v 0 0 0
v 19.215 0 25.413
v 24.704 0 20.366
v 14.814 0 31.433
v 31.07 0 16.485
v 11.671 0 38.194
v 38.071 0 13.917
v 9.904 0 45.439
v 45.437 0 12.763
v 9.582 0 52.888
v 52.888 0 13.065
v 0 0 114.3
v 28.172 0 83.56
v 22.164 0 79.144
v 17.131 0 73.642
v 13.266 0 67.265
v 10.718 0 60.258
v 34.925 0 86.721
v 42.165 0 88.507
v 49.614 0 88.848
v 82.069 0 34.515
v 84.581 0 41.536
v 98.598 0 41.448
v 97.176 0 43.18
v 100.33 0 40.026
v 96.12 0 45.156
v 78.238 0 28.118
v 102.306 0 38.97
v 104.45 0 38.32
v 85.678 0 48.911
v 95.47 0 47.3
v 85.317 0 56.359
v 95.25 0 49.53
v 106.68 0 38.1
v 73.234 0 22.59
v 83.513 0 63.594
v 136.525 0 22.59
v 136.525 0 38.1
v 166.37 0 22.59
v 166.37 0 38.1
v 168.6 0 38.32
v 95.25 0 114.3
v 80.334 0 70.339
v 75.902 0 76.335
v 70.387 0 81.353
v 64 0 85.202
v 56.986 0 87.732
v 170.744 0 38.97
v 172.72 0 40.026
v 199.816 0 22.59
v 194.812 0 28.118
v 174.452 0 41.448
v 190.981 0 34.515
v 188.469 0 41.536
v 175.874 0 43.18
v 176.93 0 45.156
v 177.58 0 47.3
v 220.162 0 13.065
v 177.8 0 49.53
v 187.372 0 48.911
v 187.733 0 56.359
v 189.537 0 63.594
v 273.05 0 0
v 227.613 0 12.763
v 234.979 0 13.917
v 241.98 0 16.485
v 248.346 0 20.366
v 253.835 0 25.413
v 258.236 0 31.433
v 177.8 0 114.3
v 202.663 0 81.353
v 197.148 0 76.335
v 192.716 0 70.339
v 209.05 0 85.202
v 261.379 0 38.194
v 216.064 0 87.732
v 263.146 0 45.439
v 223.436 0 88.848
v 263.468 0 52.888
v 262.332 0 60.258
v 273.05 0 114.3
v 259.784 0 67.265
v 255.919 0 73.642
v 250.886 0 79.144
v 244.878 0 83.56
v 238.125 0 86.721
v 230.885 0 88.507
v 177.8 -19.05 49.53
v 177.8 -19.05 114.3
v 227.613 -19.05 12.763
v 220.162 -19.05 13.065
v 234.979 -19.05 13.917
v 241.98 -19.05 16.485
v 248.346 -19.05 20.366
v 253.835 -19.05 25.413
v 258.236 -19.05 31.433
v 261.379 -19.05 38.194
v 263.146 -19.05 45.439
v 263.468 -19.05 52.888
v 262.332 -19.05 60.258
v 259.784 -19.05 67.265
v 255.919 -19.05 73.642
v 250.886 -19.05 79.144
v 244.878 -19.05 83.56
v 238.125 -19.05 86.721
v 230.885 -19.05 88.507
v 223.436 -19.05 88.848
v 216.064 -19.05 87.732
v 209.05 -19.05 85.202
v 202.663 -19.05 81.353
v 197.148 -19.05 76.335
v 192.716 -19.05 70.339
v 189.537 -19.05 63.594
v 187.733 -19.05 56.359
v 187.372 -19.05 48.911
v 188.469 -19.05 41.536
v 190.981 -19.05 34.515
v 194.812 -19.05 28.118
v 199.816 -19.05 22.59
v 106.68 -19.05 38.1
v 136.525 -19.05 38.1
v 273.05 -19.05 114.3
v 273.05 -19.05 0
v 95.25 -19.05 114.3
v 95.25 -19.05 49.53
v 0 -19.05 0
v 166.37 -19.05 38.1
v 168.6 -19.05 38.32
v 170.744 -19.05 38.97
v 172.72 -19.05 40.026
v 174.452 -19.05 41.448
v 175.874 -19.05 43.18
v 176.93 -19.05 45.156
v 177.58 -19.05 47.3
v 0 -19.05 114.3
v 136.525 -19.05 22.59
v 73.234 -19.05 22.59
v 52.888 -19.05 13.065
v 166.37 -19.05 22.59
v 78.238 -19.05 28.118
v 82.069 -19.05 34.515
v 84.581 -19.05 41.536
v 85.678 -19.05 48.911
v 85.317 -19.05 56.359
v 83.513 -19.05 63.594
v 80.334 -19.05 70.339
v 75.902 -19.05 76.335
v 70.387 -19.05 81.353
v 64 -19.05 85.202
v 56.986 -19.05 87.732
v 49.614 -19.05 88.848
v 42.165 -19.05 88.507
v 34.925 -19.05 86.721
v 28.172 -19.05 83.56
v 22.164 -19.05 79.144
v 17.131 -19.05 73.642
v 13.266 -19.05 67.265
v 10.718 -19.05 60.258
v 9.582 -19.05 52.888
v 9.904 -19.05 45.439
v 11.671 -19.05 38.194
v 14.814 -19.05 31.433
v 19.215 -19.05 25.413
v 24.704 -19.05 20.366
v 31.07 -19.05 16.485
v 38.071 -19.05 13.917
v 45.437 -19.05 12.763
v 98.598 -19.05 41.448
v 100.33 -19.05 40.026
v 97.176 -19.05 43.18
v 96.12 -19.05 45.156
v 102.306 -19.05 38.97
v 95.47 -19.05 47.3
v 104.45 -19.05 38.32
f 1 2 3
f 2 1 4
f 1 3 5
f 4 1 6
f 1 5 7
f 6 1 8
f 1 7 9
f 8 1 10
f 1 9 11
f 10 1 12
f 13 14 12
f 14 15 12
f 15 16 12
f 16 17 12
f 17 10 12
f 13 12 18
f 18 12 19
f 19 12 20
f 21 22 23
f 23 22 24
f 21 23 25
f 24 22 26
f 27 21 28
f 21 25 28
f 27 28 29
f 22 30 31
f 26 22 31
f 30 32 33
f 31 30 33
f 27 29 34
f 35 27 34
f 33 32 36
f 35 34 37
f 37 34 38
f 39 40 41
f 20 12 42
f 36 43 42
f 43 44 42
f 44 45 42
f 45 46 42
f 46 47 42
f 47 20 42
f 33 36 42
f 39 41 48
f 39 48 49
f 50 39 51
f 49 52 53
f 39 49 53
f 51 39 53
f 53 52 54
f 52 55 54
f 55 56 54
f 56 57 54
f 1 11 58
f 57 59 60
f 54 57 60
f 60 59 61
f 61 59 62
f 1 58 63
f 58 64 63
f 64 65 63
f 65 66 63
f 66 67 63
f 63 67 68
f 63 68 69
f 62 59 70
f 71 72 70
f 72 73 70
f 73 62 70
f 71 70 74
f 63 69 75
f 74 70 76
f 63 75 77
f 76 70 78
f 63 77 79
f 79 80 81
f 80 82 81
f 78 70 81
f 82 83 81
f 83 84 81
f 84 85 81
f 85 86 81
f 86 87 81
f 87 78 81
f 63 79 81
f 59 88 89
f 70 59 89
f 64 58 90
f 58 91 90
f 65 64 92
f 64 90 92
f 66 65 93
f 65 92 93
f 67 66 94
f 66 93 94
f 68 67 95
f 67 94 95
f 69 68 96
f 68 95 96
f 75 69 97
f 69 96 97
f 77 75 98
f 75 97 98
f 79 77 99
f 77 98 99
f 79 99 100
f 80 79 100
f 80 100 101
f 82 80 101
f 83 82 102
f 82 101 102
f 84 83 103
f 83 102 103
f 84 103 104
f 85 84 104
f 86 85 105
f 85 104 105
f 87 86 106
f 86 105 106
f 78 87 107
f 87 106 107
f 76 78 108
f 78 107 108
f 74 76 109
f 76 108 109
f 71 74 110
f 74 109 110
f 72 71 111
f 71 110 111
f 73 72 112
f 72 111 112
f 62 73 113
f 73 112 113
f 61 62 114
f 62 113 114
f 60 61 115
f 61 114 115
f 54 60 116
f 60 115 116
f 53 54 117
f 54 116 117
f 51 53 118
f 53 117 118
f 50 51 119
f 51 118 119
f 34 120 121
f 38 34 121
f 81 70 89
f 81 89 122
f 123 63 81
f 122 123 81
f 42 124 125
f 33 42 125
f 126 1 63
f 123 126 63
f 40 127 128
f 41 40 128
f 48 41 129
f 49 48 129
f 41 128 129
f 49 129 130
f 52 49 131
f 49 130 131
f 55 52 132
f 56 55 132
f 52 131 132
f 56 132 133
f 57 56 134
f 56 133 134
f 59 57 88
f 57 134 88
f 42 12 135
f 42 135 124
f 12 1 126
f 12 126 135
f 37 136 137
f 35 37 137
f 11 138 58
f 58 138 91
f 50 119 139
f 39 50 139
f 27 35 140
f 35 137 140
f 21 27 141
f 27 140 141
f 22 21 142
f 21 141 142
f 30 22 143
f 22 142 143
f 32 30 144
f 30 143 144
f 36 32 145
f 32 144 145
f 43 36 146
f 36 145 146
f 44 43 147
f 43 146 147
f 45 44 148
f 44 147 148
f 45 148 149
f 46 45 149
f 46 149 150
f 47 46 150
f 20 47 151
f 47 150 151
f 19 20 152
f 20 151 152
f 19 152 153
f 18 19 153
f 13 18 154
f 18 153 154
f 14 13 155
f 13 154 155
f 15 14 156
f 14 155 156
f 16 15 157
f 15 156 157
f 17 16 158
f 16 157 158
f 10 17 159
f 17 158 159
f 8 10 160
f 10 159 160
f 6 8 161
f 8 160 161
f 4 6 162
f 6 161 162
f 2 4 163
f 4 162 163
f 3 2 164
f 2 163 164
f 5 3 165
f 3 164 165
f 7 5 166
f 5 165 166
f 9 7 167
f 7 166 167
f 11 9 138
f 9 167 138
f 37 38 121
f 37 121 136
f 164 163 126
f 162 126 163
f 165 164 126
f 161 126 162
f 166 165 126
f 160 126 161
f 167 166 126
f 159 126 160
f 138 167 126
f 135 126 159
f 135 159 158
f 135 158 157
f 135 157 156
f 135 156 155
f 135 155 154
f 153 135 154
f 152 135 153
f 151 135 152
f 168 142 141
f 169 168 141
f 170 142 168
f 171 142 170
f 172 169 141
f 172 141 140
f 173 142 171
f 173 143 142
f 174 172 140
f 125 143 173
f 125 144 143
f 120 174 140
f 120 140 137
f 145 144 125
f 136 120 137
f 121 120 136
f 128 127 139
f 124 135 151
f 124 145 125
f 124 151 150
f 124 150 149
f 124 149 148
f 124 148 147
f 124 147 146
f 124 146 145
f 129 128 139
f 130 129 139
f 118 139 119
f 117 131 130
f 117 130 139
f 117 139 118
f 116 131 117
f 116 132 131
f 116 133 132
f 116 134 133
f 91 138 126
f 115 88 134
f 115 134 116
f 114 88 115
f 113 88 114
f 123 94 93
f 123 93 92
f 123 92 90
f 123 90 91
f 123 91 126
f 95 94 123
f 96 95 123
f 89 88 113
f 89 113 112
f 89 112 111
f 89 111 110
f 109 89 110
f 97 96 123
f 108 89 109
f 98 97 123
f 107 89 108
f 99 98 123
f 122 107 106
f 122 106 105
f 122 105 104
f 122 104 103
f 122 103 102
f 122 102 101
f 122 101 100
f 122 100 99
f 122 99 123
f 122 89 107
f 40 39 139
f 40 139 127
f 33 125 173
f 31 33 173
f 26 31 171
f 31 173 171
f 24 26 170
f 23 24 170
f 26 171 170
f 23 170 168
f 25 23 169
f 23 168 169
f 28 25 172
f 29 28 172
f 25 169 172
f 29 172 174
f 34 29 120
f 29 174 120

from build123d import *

# Parameters (mm, degrees)
F0_W     = 273.05
F0_H     = 114.3
F1_DEPTH = 19.05
F2_R     = 38.1
F3_DEPTH = 25.4
F5_DEPTH = 25.4
F7_DEPTH = 25.4


with BuildPart() as f1:
    # F0 (on Front) → F1 (new body)
    with BuildSketch(Plane.XZ):
        with Locations((136.525, 57.15)):
            Rectangle(F0_W, F0_H)
    extrude(amount=F1_DEPTH)

    # F2 (on face) → F3 (cut)
    with BuildSketch(Plane.XZ.offset(19.05)):
        with Locations((225.425, 50.8)):
            Circle(F2_R)
        with Locations((47.625, 50.8)):
            Circle(F2_R)
    extrude(amount=-F3_DEPTH, mode=Mode.SUBTRACT)

    # F4 (on face) → F5 (cut)
    with BuildSketch(Plane.XZ.offset(19.05)):
        with BuildLine():
            Line((177.8, 114.3), (95.25, 114.3))
            Line((95.25, 114.3), (95.25, 49.53))
            ThreePointArc((95.25, 49.53), (98.597769, 41.447769), (106.68, 38.1))
            Line((106.68, 38.1), (166.37, 38.1))
            ThreePointArc((166.37, 38.1), (174.452231, 41.447769), (177.8, 49.53))
            Line((177.8, 49.53), (177.8, 114.3))
        make_face()
    extrude(amount=-F5_DEPTH, mode=Mode.SUBTRACT)

    # F6 (on face) → F7 (cut)
    with BuildSketch(Plane.XZ.offset(19.05)):
        Polygon((166.37, 22.5902), (166.37, 38.1), (136.525, 38.1), (136.525, 22.5902), (54.541018, 22.5902), (42.362412, 13.0652), (230.687588, 13.0652), (218.817472, 22.5902), align=None)
    extrude(amount=-F7_DEPTH, mode=Mode.SUBTRACT)


solid = f1.part
